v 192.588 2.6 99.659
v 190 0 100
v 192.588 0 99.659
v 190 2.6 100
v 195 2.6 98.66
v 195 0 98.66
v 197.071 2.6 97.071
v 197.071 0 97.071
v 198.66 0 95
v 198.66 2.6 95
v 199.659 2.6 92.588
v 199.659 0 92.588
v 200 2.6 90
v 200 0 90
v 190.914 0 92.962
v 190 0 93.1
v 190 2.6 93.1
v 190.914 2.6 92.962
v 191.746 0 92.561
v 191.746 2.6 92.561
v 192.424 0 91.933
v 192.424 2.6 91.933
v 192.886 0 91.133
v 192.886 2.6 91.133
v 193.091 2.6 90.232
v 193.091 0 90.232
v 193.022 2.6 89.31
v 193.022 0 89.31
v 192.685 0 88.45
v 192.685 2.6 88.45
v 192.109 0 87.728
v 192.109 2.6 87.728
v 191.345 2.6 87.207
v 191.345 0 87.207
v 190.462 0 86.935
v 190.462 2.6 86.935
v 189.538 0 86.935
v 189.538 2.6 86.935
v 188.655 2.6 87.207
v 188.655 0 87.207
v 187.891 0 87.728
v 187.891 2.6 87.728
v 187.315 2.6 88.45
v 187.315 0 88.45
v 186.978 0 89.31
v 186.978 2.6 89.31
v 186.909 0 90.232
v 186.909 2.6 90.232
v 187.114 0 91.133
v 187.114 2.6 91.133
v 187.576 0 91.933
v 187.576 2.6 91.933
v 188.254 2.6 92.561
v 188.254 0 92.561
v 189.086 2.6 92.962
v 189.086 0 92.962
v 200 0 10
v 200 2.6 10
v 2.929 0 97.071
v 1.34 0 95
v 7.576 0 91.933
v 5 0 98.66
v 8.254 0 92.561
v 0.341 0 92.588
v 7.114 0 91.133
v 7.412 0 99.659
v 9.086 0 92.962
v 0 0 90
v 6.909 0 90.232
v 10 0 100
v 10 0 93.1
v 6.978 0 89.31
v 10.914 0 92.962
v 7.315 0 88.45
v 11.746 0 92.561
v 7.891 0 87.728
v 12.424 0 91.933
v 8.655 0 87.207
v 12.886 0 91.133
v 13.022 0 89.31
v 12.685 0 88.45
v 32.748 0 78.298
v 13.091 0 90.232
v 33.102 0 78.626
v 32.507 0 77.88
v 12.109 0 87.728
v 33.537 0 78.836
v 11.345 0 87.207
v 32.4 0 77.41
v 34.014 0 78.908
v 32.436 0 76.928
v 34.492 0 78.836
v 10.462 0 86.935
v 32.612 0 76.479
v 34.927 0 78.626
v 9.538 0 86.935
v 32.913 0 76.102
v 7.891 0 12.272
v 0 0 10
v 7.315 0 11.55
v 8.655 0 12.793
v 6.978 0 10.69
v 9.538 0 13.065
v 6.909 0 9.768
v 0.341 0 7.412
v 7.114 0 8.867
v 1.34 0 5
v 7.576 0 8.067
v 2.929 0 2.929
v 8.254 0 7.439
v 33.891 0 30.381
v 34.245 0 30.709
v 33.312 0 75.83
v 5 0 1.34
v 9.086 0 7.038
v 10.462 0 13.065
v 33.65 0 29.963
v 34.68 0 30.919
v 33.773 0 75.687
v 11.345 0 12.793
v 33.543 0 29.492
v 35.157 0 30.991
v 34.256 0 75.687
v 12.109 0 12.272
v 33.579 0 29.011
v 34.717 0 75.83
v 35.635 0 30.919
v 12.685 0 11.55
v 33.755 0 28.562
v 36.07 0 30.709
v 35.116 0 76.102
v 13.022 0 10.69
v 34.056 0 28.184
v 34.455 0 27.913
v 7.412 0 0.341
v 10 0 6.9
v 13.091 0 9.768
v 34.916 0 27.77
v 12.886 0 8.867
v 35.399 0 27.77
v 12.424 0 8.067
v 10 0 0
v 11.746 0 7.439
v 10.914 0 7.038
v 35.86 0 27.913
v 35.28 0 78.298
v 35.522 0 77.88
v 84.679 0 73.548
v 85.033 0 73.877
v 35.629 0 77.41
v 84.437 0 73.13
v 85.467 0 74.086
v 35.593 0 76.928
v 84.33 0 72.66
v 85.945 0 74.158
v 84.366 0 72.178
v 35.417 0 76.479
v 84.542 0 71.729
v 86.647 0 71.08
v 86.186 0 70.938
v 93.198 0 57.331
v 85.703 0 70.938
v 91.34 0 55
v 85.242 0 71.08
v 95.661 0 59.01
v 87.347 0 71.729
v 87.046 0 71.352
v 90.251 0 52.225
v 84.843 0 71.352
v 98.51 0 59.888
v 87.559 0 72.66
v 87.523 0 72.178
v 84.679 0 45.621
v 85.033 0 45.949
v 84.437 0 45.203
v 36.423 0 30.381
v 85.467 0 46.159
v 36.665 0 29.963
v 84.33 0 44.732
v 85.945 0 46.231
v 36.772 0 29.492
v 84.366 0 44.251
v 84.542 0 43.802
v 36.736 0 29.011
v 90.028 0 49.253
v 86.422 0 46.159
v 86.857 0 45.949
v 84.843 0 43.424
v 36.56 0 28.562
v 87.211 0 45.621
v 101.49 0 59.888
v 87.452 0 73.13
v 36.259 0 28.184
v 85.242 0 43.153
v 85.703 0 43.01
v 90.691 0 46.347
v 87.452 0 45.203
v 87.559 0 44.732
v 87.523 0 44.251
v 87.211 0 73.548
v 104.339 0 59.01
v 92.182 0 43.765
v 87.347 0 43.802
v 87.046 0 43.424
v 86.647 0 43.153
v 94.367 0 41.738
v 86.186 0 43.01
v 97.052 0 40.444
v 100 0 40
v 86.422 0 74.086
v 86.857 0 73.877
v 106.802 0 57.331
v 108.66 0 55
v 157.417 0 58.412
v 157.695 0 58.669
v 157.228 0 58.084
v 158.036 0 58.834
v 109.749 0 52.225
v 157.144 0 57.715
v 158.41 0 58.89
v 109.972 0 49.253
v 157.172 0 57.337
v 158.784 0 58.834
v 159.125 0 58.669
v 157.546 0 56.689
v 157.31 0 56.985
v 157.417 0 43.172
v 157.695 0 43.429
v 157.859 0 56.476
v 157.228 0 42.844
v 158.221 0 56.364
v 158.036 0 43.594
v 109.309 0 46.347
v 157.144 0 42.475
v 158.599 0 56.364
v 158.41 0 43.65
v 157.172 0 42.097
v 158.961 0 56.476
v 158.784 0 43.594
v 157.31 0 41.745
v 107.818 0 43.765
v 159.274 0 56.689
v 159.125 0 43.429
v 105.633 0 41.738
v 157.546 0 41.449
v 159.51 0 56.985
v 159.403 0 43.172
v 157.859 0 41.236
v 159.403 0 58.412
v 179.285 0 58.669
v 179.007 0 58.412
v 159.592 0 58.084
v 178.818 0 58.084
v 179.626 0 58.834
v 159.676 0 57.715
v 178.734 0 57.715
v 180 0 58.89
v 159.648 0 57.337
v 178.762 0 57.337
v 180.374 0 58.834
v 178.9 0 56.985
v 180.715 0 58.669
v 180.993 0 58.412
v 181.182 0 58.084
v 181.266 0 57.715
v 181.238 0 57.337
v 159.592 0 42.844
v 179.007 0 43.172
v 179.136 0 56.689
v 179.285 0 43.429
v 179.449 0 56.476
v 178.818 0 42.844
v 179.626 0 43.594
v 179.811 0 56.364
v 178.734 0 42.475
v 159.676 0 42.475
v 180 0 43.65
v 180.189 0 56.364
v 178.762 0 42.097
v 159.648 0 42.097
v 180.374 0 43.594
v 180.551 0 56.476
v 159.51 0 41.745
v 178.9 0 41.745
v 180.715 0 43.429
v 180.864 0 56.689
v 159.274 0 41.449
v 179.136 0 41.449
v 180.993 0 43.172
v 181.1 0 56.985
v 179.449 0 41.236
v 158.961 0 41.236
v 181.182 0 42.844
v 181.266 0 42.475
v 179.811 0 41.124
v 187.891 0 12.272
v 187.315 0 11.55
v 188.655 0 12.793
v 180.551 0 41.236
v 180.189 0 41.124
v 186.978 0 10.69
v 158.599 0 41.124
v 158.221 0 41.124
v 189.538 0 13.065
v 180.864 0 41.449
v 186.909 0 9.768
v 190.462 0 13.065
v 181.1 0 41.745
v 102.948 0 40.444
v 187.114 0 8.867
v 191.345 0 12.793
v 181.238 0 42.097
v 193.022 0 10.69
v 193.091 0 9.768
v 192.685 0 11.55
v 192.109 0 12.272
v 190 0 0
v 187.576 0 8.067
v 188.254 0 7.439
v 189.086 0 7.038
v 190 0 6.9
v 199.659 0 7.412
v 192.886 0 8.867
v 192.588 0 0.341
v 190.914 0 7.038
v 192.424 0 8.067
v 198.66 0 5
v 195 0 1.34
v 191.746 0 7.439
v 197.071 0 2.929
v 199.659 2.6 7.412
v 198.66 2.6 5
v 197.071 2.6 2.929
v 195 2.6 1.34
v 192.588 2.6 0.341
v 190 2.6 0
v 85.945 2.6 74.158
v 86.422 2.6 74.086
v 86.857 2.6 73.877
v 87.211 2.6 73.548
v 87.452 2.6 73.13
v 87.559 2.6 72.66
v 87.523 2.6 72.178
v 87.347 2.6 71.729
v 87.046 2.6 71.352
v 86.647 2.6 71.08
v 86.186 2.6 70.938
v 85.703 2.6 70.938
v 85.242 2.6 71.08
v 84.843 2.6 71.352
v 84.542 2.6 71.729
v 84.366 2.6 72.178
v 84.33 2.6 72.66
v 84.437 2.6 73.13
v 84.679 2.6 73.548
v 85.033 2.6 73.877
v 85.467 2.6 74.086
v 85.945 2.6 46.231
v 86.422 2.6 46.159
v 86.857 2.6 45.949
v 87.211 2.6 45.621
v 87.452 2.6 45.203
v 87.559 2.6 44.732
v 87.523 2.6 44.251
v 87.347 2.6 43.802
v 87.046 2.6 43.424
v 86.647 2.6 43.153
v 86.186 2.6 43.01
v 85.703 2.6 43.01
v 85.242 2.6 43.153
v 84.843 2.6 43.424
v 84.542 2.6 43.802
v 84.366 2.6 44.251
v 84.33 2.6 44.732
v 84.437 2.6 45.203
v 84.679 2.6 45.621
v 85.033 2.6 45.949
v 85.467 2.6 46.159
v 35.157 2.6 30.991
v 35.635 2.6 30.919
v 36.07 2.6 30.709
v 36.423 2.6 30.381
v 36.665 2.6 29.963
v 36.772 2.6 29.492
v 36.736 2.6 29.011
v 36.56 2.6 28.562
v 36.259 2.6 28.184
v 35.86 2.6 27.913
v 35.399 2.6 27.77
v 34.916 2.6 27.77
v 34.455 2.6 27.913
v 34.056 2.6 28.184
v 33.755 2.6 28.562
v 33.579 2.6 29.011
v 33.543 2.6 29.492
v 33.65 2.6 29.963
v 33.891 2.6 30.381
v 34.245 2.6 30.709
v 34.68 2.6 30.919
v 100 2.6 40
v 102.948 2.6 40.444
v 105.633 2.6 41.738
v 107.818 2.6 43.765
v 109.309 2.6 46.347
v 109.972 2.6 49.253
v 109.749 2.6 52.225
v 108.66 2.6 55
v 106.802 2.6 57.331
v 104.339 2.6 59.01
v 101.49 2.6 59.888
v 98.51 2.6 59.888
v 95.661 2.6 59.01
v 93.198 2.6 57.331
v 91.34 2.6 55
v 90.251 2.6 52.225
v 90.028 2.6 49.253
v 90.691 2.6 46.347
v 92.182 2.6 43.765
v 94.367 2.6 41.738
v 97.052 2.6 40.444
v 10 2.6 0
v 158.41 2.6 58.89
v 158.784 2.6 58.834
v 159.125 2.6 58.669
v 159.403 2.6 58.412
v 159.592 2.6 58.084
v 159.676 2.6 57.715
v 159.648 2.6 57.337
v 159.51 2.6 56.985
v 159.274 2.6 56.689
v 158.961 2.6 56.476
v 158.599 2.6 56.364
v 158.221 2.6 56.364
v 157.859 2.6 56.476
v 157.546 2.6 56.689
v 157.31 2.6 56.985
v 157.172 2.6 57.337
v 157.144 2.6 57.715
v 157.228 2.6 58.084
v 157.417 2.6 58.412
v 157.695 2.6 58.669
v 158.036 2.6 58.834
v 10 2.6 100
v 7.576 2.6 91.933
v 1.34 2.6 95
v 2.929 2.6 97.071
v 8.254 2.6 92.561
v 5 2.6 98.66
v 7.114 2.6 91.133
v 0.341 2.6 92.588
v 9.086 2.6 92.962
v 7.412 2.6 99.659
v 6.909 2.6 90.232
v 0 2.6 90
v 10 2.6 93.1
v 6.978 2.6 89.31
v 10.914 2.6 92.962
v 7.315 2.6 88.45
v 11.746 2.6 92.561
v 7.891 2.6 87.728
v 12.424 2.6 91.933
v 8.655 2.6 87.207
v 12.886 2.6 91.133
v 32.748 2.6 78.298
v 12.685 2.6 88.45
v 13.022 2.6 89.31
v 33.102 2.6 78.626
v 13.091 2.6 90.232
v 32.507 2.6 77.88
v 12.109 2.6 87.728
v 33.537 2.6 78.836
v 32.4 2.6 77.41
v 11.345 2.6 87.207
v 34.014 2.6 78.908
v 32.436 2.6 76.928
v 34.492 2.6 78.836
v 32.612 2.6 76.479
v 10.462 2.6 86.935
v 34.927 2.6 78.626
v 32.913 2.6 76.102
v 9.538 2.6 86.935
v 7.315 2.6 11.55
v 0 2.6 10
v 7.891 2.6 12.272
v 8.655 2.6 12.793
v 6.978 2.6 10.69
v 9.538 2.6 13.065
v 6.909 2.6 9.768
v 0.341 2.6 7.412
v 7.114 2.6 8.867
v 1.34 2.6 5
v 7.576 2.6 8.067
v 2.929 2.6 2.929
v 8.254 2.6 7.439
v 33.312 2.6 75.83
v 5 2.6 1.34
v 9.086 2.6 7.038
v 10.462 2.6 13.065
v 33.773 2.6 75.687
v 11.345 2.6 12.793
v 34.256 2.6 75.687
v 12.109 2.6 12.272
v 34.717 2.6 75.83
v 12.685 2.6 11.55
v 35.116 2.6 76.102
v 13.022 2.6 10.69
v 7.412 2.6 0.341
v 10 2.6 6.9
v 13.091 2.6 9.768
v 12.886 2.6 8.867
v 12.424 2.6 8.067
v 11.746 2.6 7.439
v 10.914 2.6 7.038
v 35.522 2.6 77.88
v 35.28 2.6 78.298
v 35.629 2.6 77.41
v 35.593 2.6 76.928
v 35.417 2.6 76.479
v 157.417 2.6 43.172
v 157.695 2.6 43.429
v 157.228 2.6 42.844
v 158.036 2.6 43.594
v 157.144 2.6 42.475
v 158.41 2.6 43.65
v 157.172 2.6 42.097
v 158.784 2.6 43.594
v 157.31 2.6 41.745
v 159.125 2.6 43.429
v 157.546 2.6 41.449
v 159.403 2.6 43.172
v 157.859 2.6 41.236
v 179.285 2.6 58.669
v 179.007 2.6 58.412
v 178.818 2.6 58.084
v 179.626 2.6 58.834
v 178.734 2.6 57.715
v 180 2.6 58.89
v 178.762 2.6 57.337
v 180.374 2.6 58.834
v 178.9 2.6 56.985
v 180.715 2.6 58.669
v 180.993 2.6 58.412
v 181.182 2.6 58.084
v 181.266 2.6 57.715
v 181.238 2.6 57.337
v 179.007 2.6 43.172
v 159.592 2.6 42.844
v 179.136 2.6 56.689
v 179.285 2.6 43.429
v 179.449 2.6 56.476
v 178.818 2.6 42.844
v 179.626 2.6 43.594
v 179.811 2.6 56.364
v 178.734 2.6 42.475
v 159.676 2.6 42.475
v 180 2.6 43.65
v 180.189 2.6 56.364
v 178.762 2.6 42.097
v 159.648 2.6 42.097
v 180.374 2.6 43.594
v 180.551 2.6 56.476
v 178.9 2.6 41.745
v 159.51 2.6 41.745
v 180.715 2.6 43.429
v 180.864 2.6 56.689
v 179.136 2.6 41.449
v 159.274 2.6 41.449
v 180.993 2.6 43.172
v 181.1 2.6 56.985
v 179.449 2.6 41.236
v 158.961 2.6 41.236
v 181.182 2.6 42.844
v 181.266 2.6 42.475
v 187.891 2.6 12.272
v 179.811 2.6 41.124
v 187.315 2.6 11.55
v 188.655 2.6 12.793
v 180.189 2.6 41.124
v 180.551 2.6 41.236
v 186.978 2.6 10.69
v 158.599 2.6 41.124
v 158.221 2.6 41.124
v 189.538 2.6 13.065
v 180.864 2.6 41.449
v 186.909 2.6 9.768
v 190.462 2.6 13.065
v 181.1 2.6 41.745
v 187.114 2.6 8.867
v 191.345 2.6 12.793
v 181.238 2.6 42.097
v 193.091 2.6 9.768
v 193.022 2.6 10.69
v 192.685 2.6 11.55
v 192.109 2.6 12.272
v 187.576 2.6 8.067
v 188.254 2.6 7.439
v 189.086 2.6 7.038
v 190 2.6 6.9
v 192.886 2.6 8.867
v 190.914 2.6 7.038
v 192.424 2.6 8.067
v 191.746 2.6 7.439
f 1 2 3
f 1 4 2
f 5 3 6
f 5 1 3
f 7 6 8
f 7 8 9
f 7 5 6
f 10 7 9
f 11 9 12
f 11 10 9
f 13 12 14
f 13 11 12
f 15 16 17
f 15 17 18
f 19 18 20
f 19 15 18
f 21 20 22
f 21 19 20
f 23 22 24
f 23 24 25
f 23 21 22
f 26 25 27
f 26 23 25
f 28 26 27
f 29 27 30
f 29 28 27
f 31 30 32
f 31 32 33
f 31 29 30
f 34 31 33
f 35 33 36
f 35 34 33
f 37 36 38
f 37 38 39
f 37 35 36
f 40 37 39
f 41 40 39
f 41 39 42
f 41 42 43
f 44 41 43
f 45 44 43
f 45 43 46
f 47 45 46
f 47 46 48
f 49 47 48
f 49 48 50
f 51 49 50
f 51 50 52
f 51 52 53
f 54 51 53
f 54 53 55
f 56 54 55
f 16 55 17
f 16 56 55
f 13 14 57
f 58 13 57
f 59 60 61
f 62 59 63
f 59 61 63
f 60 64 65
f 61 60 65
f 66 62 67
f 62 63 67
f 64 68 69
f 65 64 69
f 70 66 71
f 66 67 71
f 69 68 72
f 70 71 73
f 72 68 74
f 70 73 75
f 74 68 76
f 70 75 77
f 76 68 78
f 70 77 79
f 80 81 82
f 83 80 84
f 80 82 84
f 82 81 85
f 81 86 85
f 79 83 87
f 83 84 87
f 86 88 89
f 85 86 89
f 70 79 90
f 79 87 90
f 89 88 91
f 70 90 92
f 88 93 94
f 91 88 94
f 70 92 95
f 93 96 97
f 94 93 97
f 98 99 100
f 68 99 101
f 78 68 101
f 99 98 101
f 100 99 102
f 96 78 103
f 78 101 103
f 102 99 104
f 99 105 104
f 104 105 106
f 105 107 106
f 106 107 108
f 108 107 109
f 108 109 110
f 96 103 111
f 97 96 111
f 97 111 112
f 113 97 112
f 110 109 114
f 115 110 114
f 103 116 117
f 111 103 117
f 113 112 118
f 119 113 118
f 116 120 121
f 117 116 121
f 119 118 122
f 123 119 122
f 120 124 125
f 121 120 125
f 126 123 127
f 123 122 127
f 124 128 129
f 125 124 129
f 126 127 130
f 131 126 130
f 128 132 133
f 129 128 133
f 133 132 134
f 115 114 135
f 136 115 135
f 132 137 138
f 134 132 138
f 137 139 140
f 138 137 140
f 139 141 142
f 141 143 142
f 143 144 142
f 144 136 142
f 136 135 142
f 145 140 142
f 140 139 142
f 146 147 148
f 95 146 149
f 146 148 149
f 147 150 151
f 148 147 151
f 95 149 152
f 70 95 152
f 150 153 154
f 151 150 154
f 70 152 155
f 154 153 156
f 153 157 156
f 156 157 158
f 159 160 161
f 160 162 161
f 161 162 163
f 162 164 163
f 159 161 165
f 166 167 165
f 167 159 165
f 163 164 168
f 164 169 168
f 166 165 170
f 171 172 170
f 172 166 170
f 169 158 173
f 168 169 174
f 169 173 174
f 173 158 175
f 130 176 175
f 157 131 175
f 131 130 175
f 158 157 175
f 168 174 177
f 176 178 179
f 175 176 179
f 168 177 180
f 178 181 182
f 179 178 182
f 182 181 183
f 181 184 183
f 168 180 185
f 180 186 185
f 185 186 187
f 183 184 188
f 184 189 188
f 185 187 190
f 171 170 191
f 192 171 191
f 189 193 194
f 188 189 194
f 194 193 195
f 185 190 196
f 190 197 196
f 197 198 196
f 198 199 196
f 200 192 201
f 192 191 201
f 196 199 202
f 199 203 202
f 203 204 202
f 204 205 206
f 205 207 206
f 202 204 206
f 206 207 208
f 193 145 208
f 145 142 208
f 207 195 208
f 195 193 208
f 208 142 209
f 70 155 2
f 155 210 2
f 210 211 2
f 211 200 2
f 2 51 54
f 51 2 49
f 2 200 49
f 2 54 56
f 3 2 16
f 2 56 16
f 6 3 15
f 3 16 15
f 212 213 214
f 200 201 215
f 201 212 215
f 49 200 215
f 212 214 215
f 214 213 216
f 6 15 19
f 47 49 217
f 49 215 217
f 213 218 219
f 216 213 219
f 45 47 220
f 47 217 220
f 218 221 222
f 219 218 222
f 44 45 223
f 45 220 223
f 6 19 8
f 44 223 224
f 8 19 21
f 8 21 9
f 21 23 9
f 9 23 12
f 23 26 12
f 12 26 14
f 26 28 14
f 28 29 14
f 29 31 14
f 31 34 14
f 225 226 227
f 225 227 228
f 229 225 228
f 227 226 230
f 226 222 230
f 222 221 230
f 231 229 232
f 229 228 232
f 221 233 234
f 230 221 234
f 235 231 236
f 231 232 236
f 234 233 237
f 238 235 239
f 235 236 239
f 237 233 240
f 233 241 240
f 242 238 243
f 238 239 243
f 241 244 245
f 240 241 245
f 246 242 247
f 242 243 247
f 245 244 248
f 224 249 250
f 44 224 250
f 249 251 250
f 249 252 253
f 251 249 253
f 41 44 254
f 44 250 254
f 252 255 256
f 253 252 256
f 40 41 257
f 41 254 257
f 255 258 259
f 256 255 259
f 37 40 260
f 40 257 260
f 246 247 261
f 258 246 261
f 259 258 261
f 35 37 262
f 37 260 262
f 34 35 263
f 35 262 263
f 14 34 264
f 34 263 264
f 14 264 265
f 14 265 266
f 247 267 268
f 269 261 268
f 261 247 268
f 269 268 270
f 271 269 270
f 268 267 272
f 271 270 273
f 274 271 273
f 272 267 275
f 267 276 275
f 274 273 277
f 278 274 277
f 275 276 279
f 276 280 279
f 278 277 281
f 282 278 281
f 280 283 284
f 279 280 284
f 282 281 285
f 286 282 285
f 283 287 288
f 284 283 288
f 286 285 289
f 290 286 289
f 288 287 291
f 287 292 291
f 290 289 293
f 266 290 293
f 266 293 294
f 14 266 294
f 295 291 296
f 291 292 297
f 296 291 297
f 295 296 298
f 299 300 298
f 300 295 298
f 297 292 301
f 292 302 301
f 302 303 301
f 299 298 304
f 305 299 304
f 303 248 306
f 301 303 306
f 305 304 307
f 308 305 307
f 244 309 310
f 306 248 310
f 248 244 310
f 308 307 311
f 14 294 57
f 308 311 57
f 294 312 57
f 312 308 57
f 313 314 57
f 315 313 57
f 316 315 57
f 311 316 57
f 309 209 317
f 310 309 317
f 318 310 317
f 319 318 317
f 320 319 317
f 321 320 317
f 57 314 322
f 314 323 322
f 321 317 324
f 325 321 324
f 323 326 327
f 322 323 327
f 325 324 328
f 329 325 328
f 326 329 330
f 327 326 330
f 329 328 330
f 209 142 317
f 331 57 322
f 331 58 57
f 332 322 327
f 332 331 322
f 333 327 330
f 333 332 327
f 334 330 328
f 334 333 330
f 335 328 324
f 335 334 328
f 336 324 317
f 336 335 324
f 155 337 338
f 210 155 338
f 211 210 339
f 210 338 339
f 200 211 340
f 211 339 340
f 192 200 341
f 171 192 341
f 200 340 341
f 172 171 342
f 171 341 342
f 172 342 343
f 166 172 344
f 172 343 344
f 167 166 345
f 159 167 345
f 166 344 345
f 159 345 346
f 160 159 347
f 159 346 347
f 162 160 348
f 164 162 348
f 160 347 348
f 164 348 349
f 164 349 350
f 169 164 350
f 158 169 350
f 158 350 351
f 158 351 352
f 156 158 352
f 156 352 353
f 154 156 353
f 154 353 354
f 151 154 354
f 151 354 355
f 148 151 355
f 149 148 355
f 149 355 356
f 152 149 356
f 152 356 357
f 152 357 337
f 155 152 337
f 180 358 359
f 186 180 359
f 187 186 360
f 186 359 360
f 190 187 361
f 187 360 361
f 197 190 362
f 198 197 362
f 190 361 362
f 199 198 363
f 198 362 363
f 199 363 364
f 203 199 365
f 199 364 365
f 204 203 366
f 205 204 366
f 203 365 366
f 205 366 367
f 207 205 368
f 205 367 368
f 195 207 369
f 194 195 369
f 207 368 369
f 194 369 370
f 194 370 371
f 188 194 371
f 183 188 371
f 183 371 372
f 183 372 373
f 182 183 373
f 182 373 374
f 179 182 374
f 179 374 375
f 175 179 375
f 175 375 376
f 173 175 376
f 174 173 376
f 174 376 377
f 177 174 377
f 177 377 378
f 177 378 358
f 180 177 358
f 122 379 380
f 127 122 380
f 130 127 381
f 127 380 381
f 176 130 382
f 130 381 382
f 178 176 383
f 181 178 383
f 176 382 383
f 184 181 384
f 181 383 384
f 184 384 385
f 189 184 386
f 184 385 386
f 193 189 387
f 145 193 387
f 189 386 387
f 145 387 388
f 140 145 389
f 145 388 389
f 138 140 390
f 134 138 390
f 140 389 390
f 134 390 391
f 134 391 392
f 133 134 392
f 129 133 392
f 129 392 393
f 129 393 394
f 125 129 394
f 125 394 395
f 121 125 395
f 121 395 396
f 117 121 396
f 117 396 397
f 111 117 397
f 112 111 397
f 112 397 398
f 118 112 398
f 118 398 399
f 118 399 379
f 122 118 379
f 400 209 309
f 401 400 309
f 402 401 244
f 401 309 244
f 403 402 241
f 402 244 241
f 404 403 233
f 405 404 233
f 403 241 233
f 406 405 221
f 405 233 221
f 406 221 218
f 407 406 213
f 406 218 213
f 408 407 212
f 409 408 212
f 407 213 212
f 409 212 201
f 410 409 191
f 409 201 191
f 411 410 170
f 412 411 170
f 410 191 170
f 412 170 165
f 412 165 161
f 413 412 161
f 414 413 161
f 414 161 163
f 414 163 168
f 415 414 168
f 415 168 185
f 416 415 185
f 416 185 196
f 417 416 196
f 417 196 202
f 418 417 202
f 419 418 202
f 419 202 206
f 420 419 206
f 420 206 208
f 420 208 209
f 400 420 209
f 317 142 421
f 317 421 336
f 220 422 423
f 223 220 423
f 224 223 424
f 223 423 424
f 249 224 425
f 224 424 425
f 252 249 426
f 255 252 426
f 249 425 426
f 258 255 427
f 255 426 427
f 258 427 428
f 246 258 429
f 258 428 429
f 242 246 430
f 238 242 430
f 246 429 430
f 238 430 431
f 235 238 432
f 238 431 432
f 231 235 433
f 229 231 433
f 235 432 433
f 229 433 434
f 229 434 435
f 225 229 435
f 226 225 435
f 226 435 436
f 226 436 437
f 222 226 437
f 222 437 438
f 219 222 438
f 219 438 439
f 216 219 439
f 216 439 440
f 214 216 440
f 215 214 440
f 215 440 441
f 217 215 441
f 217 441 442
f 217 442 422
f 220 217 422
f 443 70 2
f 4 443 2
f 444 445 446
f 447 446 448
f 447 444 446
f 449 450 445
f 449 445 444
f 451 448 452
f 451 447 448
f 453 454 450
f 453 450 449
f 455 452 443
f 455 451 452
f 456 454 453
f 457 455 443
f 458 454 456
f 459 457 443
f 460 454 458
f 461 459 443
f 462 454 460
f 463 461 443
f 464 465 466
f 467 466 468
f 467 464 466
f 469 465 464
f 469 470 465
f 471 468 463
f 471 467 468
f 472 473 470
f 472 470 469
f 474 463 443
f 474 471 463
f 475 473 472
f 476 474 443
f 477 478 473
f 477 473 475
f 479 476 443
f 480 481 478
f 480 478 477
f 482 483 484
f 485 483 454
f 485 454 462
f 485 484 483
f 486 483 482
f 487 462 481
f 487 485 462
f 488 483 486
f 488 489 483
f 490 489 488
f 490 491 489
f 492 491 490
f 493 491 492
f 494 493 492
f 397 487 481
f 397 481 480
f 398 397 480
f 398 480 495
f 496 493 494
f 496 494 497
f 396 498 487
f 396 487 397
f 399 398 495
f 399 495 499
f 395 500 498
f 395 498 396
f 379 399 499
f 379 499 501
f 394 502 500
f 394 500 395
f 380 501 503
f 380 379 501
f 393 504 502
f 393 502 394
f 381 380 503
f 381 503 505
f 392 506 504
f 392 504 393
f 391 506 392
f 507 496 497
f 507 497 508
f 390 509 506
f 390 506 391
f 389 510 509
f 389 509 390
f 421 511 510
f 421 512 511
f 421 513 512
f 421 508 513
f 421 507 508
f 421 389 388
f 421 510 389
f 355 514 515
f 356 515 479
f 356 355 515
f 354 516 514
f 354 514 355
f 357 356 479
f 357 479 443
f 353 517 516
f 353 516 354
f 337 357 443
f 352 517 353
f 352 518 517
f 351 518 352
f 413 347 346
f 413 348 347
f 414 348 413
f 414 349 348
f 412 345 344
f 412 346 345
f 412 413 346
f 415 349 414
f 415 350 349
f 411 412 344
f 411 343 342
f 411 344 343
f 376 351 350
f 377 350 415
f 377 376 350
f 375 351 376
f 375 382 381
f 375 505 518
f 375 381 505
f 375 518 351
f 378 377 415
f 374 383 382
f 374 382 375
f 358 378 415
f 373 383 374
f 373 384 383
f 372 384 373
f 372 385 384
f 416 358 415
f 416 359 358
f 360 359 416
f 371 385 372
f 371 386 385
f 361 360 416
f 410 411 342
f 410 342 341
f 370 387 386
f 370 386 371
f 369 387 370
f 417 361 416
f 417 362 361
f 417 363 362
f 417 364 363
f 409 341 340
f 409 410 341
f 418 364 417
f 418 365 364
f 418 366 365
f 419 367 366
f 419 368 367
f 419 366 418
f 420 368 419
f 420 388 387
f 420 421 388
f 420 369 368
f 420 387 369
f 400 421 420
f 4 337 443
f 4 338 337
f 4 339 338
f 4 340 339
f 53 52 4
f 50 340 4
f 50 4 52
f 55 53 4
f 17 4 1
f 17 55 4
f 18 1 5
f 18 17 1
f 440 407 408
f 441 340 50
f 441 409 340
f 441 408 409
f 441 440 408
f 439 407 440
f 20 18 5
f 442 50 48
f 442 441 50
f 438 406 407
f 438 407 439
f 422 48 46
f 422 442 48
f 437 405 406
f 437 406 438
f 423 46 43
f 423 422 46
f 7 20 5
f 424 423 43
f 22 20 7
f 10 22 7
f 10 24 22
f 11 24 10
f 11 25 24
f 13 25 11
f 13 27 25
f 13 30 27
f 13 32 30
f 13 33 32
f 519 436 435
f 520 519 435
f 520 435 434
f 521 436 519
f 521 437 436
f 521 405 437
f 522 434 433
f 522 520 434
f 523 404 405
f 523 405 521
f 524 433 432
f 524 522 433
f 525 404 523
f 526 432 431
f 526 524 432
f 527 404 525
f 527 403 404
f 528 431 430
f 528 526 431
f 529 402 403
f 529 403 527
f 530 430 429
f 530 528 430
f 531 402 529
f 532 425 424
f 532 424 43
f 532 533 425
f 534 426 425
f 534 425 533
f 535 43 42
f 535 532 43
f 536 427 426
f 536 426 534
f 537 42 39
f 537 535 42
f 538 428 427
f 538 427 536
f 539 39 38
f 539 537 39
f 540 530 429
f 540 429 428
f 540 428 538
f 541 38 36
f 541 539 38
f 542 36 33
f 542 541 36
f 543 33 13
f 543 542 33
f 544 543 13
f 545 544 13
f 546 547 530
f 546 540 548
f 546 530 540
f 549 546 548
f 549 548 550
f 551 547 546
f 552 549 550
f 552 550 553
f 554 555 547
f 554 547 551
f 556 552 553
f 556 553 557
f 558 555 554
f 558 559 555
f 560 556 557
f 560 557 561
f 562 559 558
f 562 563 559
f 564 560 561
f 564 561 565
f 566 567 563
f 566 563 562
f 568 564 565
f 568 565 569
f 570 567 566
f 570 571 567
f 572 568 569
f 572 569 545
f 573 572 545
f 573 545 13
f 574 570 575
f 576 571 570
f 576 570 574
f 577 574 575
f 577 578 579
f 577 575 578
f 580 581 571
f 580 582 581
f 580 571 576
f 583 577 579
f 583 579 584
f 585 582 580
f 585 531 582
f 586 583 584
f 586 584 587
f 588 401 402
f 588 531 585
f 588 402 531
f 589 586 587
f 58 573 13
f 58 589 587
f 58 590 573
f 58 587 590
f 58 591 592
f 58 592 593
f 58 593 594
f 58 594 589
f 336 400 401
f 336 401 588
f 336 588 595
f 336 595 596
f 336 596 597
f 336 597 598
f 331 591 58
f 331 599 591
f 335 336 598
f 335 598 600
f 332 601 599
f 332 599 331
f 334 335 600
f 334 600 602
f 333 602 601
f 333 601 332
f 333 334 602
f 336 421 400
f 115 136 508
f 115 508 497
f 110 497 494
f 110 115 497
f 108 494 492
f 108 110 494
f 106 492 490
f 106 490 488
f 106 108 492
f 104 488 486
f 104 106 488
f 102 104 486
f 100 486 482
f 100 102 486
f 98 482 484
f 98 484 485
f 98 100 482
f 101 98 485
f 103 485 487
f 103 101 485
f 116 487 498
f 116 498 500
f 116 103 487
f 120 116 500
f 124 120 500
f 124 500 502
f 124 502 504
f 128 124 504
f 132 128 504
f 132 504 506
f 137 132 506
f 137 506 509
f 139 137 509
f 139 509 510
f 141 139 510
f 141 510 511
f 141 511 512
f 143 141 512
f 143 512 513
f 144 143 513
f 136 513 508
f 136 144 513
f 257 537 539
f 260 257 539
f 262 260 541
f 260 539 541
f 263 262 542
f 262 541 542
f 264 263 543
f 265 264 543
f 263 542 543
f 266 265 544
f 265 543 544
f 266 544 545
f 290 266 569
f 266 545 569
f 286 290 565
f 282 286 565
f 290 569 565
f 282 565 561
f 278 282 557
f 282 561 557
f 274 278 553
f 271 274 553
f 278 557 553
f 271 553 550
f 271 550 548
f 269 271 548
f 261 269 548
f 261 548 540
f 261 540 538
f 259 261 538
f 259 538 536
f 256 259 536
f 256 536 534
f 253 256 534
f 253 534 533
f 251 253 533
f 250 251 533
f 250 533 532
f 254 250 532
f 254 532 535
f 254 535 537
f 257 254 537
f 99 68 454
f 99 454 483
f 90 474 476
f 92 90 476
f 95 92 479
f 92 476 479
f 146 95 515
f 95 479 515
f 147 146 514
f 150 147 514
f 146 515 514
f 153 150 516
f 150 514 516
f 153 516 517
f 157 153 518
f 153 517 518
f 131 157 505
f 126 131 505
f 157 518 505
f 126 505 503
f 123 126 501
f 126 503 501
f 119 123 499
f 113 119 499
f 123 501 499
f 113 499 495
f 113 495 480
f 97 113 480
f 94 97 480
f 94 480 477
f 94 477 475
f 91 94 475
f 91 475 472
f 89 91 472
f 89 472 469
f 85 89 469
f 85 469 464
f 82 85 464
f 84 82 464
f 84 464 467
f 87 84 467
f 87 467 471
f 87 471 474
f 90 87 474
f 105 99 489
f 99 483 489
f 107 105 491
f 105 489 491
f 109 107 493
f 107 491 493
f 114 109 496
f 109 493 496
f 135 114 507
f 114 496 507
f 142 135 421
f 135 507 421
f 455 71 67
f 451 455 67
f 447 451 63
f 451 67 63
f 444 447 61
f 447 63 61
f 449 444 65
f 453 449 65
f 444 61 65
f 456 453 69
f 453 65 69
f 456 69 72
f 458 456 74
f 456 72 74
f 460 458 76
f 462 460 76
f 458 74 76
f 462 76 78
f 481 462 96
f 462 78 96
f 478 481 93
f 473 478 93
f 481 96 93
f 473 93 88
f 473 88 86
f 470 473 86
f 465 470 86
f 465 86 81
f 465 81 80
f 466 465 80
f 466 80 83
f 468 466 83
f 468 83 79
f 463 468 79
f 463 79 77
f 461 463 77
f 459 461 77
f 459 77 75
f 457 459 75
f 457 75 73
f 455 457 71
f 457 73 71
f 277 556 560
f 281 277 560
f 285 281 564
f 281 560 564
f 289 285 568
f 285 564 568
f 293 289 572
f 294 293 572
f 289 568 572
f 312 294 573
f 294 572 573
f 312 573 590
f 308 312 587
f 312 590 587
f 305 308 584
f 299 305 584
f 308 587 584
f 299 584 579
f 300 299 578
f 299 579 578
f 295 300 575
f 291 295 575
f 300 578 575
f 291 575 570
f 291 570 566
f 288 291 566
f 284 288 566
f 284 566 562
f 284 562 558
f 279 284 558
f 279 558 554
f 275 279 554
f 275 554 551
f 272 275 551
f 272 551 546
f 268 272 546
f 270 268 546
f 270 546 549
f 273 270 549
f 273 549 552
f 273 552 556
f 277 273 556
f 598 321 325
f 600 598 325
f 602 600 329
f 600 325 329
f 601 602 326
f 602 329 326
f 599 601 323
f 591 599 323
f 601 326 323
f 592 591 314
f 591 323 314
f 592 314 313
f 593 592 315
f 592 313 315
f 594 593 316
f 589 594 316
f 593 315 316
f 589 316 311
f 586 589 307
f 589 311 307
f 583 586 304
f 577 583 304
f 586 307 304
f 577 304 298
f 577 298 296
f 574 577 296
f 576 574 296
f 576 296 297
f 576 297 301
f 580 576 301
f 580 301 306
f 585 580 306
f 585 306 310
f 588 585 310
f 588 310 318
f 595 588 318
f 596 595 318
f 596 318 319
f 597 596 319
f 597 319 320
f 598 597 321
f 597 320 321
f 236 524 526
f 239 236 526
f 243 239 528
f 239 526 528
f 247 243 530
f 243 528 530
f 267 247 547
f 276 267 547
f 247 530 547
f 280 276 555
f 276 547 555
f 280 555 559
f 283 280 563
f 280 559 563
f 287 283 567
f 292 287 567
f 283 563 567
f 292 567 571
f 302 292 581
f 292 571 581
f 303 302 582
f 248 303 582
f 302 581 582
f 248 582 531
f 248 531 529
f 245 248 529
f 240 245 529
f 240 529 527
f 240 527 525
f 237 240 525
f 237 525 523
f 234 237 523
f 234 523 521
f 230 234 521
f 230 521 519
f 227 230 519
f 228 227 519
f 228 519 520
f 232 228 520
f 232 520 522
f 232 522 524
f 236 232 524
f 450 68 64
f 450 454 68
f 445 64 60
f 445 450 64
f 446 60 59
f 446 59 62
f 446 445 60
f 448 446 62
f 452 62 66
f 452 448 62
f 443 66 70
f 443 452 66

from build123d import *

# Parameters (mm, degrees)
SKETCH1_W               = 200
SKETCH1_H               = 100
BOSS_EXTRUDE1_DEPTH     = 2.6
FILLET1_R               = 10
SKETCH6_R               = 3.1
CUT_EXTRUDE6_DEPTH      = 2.6
MIRROR6_COPY_1_SKETCH_R = 3.1
MIRROR6_COPY_1_DEPTH    = 2.6
MIRROR6_COPY_2_SKETCH_R = 3.1
MIRROR6_COPY_2_DEPTH    = 2.6
SKETCH16_R              = 1.61925
CUT_EXTRUDE9_DEPTH      = 10
SKETCH17_R              = 1.61925
CUT_EXTRUDE10_DEPTH     = 224.621913059
SKETCH18_R              = 1.61925
CUT_EXTRUDE11_DEPTH     = 224.621913059
SKETCH19_R              = 1.61925
CUT_EXTRUDE12_DEPTH     = 224.621913059
SKETCH15_R              = 10
CUT_EXTRUDE14_DEPTH     = 224.621913059
SKETCH20_R              = 1.27
CUT_EXTRUDE15_DEPTH     = 224.621913059


with BuildPart() as part:
    # Sketch1 → Boss-Extrude1 (new body)
    with BuildSketch(Plane(origin=(0, 0, 0), x_dir=(1, 0, 0), z_dir=(0, 1, 0))):
        with Locations((100, -50)):
            Rectangle(SKETCH1_W, SKETCH1_H)
    extrude(amount=BOSS_EXTRUDE1_DEPTH)

    # Fillet1
    fillet1_edges = [part.edges().sort_by_distance(p)[0] for p in [
        (0, 1.3, 0),
        (0, 1.3, 100),
        (200, 1.3, 100),
        (200, 1.3, 0),
    ]]
    fillet(fillet1_edges, radius=FILLET1_R)

    # Sketch6 → Cut-Extrude6 (cut)
    with BuildSketch(Plane.XZ):
        with Locations((190, 10)):
            Circle(SKETCH6_R)
    cut_extrude6 = extrude(amount=-CUT_EXTRUDE6_DEPTH, mode=Mode.SUBTRACT)

    # Mirror5: Cut-Extrude6 across plane
    add(cut_extrude6.mirror(Plane(origin=(100, 0, 0), x_dir=(0, 0, 1), z_dir=(1, 0, 0))), mode=Mode.SUBTRACT)

    # Mirror6 copy 1 sketch → Mirror6 copy 1 (cut)
    with BuildSketch(Plane(origin=(200, 0, 100), x_dir=(-1, 0, 0), z_dir=(0, -1, 0))):
        with Locations((190, 10)):
            Circle(MIRROR6_COPY_1_SKETCH_R)
    extrude(amount=-MIRROR6_COPY_1_DEPTH, mode=Mode.SUBTRACT)

    # Mirror6 copy 2 sketch → Mirror6 copy 2 (cut)
    with BuildSketch(Plane(origin=(0, 0, 100), x_dir=(1, 0, 0), z_dir=(0, -1, 0))):
        with Locations((190, -10)):
            Circle(MIRROR6_COPY_2_SKETCH_R)
    extrude(amount=-MIRROR6_COPY_2_DEPTH, mode=Mode.SUBTRACT)

    # Sketch16 → Cut-Extrude9 (cut)
    with BuildSketch(Plane(origin=(0, 2.6, 0), x_dir=(1, 0, 0), z_dir=(0, 1, 0))):
        with Locations((35.15745, -29.37145)):
            Circle(SKETCH16_R)
    extrude(amount=-CUT_EXTRUDE9_DEPTH, mode=Mode.SUBTRACT)

    # Sketch17 → Cut-Extrude10 (cut, through all)
    with BuildSketch(Plane(origin=(0, 2.6, 0), x_dir=(1, 0, 0), z_dir=(0, 1, 0))):
        with Locations((85.94475, -44.61145)):
            Circle(SKETCH17_R)
    extrude(amount=-CUT_EXTRUDE10_DEPTH, mode=Mode.SUBTRACT)

    # Sketch18 → Cut-Extrude11 (cut, through all)
    with BuildSketch(Plane(origin=(0, 2.6, 0), x_dir=(1, 0, 0), z_dir=(0, 1, 0))):
        with Locations((34.01445, -77.28855)):
            Circle(SKETCH18_R)
    extrude(amount=-CUT_EXTRUDE11_DEPTH, mode=Mode.SUBTRACT)

    # Sketch19 → Cut-Extrude12 (cut, through all)
    with BuildSketch(Plane(origin=(0, 2.6, 0), x_dir=(1, 0, 0), z_dir=(0, 1, 0))):
        with Locations((85.94475, -72.53875)):
            Circle(SKETCH19_R)
    extrude(amount=-CUT_EXTRUDE12_DEPTH, mode=Mode.SUBTRACT)

    # Sketch15 → Cut-Extrude14 (cut, through all)
    with BuildSketch(Plane.XZ):
        with Locations((100, 50)):
            Circle(SKETCH15_R)
    extrude(amount=-CUT_EXTRUDE14_DEPTH, mode=Mode.SUBTRACT)

    # Sketch20 → Cut-Extrude15 (cut, through all)
    with BuildSketch(Plane(origin=(0, 2.6, 0), x_dir=(1, 0, 0), z_dir=(0, 1, 0))):
        with Locations((158.41, -42.38)):
            Circle(SKETCH20_R)
        with Locations((180, -42.38)):
            Circle(SKETCH20_R)
        with Locations((158.41, -57.62)):
            Circle(SKETCH20_R)
        with Locations((180, -57.62)):
            Circle(SKETCH20_R)
    extrude(amount=-CUT_EXTRUDE15_DEPTH, mode=Mode.SUBTRACT)


solid = part.part
